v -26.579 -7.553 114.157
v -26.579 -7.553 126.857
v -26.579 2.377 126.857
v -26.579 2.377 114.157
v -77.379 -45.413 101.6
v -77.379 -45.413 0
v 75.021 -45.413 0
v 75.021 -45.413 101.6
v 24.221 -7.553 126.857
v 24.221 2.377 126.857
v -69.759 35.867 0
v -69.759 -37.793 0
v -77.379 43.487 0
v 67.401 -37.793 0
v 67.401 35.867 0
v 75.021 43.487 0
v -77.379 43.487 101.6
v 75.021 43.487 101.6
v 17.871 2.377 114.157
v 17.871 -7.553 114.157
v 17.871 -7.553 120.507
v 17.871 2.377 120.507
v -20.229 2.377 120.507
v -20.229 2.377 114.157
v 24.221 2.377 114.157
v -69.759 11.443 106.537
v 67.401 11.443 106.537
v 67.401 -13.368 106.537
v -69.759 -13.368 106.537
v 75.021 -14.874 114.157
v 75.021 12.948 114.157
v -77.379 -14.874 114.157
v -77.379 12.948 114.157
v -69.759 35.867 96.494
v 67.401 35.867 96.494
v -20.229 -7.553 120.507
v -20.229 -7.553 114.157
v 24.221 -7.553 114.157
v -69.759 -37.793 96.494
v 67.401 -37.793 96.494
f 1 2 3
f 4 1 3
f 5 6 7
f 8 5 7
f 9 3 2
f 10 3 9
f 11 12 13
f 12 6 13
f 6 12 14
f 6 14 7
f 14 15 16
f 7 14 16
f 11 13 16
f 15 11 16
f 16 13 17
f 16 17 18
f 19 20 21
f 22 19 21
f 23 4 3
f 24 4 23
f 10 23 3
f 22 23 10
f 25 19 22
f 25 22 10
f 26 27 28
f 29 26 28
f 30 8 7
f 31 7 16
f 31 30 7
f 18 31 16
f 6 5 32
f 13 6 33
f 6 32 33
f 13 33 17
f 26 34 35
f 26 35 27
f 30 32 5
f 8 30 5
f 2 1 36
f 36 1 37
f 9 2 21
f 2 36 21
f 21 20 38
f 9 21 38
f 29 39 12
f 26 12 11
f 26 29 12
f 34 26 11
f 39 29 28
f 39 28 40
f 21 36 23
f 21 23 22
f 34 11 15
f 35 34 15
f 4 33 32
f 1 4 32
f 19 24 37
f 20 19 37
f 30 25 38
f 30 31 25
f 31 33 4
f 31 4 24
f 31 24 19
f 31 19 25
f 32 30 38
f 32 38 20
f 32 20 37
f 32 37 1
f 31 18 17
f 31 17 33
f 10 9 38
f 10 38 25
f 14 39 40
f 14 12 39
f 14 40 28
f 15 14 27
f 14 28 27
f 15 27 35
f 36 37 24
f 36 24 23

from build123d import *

# Parameters (mm, degrees)
F0_W     = 152.4
F0_H     = 88.9
F1_DEPTH = 101.6
F3_DEPTH = 152.4
F4_W     = 50.8
F4_H     = 9.9303191528
F5_DEPTH = 12.7
F6_W     = 38.1
F6_H     = 6.35
F7_DEPTH = 25.4
F8_T     = -7.62


with BuildPart() as f1:
    # F0 (on Top) → F1 (new body)
    with BuildSketch(Plane.XY):
        with Locations((-1.1791149259, -0.9629391849)):
            Rectangle(F0_W, F0_H)
    extrude(amount=F1_DEPTH)

    # F2 (on face) → F3 (join)
    with BuildSketch(Plane.YZ.offset(75.0208850741)):
        Polygon((-14.8739154544, 114.1574053684), (-45.4129391849, 101.6), (43.4870608151, 101.6), (12.9480370846, 114.1574053684), align=None)
    extrude(amount=-F3_DEPTH)

    # F4 (on face) → F5 (join)
    with BuildSketch(Plane.XY.offset(114.1574053684)):
        with Locations((-1.1791149259, -2.587900497)):
            Rectangle(F4_W, F4_H)
    extrude(amount=F5_DEPTH)

    # F6 (on face) → F7 (cut)
    with BuildSketch(Plane.XZ.offset(7.5530600734)):
        with Locations((-1.1791149259, 117.3324053684)):
            Rectangle(F6_W, F6_H)
    extrude(amount=-F7_DEPTH, mode=Mode.SUBTRACT)

    # F8
    f8_openings = [f1.faces().sort_by_distance(p)[0] for p in [
        (-1.179115, -0.962939, 0),
    ]]
    offset(amount=F8_T, openings=f8_openings, kind=Kind.INTERSECTION)


solid = f1.part
